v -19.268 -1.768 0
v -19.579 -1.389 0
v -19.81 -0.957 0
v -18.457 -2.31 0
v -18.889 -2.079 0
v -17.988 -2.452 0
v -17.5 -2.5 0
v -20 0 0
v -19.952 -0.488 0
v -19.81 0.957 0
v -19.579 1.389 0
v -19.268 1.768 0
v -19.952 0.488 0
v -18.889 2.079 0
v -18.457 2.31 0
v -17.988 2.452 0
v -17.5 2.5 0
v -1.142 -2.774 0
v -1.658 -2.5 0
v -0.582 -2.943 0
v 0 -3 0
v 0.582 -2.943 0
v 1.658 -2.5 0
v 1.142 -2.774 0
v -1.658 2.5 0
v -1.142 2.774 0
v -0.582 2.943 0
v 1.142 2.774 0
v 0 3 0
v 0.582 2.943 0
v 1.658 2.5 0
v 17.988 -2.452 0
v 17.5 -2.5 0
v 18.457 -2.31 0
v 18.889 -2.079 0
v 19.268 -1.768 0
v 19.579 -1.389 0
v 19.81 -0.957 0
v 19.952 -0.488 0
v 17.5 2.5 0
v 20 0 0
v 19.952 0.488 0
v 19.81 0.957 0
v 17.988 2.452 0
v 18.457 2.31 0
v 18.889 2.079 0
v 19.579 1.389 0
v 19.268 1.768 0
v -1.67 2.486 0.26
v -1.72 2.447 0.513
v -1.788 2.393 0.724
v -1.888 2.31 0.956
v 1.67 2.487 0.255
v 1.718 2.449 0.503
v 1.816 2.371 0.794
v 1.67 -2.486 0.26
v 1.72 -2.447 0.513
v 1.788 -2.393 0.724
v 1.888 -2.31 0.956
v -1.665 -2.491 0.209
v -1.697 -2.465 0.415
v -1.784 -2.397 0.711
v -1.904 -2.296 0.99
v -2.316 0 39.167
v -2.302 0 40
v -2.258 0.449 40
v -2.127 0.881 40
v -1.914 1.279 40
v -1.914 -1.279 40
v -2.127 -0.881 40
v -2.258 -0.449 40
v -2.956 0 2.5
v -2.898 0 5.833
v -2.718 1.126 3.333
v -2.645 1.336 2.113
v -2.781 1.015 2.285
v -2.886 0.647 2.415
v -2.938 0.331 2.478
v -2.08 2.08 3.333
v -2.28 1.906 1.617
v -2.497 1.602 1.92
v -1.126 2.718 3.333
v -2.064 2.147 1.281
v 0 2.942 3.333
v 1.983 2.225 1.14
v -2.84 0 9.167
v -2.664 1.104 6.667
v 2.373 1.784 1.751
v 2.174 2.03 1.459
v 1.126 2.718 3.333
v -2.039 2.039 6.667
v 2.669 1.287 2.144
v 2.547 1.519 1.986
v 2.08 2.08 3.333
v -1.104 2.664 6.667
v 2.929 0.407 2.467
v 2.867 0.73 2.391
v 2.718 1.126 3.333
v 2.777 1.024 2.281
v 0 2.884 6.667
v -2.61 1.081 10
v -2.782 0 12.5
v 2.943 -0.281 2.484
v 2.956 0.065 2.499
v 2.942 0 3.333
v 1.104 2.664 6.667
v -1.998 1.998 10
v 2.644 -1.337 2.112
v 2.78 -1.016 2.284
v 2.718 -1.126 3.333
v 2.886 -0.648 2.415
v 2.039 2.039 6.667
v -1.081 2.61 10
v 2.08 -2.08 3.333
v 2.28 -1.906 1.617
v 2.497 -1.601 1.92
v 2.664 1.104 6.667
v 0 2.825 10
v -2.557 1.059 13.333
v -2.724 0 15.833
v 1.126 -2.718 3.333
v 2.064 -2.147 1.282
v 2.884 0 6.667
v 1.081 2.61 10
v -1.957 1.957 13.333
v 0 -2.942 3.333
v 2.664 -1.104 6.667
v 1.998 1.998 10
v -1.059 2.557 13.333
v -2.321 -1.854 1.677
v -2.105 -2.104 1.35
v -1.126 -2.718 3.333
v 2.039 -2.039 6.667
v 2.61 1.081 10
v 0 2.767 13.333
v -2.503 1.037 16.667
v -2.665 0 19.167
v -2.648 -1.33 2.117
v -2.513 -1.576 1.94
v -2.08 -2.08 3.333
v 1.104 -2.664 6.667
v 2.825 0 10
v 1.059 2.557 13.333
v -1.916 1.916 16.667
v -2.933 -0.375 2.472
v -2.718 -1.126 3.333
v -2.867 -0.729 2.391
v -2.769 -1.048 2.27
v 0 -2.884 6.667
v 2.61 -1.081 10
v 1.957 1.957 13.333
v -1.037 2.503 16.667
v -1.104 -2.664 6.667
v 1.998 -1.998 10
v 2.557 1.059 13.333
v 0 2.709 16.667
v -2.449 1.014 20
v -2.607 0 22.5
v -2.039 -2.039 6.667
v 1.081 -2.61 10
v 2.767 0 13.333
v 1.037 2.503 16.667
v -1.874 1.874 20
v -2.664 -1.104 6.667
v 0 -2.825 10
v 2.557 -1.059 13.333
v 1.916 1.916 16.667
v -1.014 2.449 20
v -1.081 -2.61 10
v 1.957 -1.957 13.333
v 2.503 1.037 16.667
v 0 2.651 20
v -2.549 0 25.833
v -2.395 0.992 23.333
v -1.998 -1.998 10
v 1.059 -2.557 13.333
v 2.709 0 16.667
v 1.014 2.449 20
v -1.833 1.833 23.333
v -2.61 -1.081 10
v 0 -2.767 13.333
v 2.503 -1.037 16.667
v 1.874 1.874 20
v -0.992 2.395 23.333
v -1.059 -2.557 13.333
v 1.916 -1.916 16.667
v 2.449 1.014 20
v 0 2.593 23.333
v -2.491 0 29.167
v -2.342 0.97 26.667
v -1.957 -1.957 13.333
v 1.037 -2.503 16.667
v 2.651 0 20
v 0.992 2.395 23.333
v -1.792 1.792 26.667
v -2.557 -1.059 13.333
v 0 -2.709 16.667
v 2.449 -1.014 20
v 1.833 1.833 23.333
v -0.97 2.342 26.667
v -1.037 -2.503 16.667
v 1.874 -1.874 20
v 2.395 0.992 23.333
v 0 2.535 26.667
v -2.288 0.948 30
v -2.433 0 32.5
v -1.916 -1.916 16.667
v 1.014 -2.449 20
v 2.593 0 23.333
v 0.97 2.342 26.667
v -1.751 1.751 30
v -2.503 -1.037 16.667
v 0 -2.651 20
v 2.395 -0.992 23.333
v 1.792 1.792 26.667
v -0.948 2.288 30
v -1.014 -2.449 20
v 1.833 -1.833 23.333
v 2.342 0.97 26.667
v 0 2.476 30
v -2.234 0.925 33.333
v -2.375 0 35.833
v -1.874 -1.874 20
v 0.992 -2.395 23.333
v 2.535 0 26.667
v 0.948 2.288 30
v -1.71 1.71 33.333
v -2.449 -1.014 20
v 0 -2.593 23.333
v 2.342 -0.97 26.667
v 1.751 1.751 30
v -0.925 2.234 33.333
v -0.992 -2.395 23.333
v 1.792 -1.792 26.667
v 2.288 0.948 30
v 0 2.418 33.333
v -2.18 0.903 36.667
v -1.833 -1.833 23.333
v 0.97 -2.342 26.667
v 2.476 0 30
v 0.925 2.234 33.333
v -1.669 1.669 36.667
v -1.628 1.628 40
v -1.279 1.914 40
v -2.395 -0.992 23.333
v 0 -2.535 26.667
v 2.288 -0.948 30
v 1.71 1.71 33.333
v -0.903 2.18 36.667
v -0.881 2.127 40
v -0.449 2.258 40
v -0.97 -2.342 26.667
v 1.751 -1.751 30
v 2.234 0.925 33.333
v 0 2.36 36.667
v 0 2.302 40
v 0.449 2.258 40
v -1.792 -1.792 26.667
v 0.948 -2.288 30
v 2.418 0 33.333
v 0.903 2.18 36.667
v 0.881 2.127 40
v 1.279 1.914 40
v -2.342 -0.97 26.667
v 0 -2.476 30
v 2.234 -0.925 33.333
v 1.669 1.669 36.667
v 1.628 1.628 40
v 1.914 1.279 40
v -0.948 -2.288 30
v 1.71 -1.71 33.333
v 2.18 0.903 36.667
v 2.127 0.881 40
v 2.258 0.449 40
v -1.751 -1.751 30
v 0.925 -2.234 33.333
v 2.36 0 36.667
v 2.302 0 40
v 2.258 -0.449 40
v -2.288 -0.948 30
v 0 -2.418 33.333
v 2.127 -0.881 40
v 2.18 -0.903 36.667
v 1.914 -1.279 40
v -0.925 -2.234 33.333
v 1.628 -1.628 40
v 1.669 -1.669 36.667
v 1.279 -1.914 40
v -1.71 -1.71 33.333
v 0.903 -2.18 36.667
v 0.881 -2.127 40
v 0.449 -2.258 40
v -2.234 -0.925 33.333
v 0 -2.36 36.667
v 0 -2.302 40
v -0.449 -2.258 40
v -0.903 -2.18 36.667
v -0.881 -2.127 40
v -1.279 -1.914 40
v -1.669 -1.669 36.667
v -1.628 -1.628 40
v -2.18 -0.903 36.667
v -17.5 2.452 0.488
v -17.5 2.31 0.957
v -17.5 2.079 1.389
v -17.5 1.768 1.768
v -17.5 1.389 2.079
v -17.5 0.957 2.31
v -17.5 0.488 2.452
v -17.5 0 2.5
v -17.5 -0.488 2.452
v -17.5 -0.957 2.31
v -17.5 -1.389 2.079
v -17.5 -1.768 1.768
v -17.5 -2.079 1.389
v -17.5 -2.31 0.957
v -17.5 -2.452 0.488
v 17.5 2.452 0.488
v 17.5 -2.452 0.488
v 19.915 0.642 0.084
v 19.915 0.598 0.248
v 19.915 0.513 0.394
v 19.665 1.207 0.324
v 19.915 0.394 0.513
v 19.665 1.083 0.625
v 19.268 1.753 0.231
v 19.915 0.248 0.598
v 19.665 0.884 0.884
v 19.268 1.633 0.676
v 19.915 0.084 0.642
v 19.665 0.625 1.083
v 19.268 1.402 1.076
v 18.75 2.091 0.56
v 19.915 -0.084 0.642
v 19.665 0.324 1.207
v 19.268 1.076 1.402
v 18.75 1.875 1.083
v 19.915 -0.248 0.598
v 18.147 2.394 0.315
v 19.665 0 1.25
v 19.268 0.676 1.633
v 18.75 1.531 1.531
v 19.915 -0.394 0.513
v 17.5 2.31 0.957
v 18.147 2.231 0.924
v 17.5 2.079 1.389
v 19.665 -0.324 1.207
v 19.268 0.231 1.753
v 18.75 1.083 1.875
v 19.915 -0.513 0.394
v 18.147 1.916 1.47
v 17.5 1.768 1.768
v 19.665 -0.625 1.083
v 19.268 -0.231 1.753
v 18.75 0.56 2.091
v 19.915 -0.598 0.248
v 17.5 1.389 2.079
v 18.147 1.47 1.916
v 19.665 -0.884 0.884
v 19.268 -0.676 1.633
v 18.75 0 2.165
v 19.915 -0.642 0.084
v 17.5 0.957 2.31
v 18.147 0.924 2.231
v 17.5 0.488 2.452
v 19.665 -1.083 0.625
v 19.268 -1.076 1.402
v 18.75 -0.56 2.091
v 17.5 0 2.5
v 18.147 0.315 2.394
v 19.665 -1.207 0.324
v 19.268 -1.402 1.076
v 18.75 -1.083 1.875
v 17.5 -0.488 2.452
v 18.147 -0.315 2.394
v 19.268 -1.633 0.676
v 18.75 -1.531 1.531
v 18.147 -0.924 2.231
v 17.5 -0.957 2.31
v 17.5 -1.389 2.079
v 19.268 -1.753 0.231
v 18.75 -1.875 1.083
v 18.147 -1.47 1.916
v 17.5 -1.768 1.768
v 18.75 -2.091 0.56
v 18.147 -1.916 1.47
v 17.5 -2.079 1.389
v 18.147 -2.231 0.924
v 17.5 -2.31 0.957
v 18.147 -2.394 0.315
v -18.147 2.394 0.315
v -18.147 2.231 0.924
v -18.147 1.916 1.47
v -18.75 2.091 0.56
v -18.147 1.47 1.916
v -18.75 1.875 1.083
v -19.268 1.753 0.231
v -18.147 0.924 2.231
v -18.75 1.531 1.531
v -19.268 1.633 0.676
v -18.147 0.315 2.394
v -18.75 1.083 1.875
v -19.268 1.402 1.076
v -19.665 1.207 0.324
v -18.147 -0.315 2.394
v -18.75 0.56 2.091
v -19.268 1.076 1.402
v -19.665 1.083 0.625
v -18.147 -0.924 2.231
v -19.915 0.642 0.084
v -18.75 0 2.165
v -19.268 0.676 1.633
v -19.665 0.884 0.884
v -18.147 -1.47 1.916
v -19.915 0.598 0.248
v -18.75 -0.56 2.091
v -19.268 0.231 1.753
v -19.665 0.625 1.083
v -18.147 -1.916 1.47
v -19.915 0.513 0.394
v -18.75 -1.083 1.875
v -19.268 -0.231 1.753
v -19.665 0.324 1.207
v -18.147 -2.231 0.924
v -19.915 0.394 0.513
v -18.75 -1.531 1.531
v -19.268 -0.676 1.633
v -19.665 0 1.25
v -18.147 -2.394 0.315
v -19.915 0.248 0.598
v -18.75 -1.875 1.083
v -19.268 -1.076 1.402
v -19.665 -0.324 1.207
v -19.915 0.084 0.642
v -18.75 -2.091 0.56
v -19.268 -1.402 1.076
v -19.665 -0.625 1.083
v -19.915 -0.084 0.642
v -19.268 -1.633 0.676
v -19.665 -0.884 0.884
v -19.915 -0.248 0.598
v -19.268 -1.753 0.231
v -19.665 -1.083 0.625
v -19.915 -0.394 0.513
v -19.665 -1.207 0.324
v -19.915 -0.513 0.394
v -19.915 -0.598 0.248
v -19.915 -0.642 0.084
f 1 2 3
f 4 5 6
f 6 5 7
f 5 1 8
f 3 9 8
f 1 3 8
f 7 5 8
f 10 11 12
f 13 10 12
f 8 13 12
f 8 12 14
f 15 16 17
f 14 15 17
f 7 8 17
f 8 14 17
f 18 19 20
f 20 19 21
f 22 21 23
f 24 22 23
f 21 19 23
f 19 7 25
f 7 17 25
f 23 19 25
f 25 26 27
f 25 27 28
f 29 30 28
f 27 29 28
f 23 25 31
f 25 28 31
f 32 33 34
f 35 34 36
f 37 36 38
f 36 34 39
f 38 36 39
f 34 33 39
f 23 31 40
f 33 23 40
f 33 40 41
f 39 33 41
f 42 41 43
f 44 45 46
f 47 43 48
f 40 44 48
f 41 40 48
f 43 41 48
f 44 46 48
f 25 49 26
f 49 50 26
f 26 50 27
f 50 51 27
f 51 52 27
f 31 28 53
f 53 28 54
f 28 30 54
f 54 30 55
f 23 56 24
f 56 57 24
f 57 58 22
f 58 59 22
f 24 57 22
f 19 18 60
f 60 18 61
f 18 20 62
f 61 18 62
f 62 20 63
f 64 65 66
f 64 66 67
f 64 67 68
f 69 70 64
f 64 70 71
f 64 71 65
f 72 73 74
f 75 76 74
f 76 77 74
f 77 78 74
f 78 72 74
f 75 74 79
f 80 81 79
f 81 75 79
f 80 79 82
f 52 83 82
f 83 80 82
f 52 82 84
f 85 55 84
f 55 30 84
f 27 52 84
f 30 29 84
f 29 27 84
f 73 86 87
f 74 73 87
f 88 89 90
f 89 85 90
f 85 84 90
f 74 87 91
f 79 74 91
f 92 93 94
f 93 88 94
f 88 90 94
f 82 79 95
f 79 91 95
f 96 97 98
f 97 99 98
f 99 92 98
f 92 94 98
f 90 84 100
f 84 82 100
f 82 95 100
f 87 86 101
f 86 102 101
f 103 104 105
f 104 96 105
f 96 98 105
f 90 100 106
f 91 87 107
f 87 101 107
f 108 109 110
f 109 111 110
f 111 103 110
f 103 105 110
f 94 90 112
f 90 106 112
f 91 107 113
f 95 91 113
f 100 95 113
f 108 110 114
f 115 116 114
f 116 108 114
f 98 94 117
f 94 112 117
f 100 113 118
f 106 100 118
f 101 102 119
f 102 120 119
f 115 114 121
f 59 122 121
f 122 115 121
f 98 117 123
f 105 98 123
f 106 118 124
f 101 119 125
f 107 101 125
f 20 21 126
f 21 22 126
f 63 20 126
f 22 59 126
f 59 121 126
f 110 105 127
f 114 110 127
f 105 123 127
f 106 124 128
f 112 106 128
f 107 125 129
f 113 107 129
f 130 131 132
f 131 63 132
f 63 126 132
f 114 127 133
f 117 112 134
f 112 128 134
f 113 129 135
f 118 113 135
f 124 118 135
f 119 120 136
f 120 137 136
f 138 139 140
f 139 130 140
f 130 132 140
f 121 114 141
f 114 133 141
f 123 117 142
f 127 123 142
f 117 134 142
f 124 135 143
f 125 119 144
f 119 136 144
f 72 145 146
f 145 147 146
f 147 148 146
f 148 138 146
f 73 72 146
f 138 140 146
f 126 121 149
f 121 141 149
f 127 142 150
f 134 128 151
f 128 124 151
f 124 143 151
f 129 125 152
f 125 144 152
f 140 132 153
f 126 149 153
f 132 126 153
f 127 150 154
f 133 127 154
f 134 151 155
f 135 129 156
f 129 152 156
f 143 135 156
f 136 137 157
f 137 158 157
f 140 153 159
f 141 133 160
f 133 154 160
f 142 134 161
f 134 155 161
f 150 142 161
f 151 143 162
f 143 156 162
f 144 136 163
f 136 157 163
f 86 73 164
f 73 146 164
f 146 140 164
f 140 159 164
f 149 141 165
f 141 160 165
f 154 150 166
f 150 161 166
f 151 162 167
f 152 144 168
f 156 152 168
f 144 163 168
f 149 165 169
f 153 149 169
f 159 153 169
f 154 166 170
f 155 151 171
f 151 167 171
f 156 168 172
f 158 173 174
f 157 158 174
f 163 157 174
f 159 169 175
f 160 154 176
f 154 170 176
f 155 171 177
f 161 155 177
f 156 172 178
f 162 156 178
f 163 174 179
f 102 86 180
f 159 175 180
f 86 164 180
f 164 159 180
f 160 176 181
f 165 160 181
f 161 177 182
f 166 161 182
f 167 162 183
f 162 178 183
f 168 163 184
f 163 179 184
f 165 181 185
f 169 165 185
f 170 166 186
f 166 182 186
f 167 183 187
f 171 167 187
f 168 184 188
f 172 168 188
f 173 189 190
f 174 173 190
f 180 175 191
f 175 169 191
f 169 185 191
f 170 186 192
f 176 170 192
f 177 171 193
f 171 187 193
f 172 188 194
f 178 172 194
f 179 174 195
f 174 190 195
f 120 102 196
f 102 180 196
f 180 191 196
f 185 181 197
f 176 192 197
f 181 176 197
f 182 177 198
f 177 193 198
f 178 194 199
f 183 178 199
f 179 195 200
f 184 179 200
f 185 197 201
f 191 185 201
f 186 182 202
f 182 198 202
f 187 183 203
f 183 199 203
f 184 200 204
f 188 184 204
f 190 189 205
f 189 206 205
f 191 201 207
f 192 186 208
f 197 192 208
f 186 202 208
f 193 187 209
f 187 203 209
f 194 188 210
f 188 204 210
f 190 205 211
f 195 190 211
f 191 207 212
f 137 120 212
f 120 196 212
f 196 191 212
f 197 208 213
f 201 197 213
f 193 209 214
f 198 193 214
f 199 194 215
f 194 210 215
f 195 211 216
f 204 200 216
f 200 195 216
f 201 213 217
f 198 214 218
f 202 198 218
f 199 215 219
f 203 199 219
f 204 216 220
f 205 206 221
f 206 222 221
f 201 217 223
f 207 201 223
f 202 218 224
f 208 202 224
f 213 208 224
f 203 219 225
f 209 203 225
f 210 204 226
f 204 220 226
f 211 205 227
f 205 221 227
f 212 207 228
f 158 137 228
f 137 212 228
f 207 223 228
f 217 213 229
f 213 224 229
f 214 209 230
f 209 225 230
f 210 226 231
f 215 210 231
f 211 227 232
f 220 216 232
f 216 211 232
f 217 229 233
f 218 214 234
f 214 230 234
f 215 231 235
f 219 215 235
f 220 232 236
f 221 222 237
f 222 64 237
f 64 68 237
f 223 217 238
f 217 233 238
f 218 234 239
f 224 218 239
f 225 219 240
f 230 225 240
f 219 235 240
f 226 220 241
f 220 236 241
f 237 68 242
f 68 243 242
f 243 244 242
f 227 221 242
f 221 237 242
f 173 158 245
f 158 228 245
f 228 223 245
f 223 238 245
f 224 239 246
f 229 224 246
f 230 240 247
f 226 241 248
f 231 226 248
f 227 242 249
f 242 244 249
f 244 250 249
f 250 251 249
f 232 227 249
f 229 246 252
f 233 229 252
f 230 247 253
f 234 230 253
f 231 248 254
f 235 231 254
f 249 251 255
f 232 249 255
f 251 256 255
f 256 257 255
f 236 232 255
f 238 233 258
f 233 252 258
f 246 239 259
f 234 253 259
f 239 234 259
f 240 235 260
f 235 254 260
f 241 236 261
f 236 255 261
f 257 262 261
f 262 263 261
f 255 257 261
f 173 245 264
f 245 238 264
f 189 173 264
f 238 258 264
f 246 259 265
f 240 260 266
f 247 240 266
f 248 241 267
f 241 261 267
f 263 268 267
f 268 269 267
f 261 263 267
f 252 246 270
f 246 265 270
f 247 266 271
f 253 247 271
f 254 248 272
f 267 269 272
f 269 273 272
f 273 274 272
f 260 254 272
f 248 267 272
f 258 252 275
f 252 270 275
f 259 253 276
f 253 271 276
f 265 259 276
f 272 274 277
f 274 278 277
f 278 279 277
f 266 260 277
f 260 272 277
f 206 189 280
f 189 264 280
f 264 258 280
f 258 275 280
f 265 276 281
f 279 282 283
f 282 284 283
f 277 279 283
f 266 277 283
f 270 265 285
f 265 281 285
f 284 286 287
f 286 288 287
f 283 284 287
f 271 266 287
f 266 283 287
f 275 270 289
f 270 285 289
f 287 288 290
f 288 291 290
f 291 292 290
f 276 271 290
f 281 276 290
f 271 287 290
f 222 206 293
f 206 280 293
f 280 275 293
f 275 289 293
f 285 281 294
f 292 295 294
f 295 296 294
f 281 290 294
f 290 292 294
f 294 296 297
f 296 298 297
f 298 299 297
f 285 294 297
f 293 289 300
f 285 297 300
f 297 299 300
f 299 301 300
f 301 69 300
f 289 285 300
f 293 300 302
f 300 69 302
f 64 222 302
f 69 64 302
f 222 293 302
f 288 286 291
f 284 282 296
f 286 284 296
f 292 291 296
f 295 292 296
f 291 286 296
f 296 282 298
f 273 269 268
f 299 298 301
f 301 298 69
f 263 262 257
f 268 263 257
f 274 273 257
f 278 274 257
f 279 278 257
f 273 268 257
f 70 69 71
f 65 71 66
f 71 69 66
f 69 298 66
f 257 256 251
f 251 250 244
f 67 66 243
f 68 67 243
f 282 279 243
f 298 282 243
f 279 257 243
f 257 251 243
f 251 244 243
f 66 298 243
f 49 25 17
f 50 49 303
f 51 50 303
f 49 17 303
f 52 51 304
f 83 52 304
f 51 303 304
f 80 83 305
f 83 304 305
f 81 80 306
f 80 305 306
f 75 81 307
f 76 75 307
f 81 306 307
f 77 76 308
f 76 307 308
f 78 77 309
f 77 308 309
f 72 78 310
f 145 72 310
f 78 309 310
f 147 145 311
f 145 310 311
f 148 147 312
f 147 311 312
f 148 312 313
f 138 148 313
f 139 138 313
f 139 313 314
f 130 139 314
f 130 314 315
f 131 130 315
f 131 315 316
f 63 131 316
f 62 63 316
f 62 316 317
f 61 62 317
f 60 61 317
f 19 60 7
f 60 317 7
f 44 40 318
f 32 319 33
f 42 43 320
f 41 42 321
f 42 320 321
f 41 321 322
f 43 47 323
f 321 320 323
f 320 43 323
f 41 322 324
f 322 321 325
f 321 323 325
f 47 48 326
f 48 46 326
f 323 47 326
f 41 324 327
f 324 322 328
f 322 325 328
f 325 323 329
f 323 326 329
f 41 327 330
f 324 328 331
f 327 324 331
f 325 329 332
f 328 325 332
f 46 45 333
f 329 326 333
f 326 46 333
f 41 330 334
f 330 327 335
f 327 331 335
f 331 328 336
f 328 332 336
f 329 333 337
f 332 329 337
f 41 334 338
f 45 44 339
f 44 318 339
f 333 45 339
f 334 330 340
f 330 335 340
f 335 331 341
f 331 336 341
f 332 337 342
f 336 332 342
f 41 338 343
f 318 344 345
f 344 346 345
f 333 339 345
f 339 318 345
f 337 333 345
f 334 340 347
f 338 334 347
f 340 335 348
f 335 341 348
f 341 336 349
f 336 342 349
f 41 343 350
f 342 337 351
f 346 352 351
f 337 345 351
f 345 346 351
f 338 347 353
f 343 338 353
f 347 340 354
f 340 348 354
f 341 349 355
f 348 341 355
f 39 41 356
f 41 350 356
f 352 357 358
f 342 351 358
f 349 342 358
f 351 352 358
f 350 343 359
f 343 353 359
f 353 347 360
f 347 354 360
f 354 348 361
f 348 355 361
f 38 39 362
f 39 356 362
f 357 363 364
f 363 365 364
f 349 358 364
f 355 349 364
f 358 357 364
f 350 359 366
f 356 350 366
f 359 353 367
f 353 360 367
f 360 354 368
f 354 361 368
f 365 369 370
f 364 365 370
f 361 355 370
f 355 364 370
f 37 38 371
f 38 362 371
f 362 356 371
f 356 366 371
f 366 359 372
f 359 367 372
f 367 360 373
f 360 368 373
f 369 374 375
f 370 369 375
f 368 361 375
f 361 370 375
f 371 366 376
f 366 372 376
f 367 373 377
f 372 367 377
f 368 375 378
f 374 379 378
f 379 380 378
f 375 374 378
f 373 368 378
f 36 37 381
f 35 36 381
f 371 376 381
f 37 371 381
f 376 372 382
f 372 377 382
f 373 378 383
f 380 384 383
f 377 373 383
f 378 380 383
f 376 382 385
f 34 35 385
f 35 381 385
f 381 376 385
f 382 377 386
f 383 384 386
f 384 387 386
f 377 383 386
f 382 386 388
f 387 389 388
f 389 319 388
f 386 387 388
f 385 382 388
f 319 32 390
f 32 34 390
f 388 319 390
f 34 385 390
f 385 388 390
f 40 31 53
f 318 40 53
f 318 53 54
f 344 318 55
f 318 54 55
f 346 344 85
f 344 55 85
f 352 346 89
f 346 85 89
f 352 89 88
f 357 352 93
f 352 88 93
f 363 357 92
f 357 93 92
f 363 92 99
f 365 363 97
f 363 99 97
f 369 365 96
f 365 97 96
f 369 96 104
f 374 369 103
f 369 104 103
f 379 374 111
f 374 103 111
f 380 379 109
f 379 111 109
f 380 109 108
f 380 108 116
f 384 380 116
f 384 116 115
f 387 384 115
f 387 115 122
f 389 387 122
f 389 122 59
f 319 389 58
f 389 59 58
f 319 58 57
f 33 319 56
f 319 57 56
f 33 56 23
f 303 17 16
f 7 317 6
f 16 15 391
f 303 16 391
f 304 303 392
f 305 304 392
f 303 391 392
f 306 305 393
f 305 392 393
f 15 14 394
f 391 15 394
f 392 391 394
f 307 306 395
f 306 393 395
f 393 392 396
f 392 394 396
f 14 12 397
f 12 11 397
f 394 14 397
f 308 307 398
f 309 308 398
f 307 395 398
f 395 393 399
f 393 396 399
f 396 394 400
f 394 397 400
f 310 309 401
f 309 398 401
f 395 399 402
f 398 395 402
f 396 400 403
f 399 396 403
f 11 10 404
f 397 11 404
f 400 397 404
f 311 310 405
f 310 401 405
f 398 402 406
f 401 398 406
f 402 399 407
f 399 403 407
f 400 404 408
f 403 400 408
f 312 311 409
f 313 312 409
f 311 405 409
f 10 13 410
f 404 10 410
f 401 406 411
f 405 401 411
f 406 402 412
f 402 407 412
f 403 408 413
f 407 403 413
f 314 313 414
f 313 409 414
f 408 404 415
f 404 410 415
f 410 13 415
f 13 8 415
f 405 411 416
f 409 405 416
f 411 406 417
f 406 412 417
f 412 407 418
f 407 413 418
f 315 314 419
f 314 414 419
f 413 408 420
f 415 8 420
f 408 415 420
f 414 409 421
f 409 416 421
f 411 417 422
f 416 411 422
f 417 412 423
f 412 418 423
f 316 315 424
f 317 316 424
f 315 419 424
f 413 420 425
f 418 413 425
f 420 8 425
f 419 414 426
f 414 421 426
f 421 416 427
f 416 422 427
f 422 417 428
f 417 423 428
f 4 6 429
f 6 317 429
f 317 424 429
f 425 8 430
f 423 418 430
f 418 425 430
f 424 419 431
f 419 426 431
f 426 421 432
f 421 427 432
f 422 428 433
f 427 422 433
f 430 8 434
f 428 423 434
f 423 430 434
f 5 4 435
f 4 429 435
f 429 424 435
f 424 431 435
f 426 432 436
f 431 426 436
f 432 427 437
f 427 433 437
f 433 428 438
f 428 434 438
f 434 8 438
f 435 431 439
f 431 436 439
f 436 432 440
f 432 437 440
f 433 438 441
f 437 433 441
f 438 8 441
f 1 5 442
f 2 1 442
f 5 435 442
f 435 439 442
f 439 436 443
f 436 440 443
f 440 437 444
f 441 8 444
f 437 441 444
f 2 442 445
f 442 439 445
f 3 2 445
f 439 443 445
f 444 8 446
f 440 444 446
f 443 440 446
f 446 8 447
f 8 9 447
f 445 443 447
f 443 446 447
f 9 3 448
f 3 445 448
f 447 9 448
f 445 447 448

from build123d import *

# Parameters (mm, degrees)
REVOLVE1_ANGLE = 180
SKETCH2_R      = 3
EXTRUDE1_DEPTH = 40
EXTRUDE1_TAPER = 1


with BuildPart() as part:
    # Sketch1 → Revolve1 (revolve)
    with BuildSketch(Plane.XY):
        with BuildLine():
            Line((-20, 0), (20, 0))
            ThreePointArc((20, 0), (19.267766953, 1.767766953), (17.5, 2.5))
            Line((17.5, 2.5), (-17.5, 2.5))
            ThreePointArc((-17.5, 2.5), (-19.267766953, 1.767766953), (-20, 0))
        make_face()
    revolve(axis=Axis((-20, 0, 0), (1, 0, 0)), revolution_arc=REVOLVE1_ANGLE)

    # Sketch2 → Extrude1 (add)
    with BuildSketch(Plane(origin=(0, 0, 0), x_dir=(-1, 0, 0), z_dir=(0, 0, -1))):
        Circle(SKETCH2_R)
    extrude(amount=-EXTRUDE1_DEPTH, taper=EXTRUDE1_TAPER)


solid = part.part
